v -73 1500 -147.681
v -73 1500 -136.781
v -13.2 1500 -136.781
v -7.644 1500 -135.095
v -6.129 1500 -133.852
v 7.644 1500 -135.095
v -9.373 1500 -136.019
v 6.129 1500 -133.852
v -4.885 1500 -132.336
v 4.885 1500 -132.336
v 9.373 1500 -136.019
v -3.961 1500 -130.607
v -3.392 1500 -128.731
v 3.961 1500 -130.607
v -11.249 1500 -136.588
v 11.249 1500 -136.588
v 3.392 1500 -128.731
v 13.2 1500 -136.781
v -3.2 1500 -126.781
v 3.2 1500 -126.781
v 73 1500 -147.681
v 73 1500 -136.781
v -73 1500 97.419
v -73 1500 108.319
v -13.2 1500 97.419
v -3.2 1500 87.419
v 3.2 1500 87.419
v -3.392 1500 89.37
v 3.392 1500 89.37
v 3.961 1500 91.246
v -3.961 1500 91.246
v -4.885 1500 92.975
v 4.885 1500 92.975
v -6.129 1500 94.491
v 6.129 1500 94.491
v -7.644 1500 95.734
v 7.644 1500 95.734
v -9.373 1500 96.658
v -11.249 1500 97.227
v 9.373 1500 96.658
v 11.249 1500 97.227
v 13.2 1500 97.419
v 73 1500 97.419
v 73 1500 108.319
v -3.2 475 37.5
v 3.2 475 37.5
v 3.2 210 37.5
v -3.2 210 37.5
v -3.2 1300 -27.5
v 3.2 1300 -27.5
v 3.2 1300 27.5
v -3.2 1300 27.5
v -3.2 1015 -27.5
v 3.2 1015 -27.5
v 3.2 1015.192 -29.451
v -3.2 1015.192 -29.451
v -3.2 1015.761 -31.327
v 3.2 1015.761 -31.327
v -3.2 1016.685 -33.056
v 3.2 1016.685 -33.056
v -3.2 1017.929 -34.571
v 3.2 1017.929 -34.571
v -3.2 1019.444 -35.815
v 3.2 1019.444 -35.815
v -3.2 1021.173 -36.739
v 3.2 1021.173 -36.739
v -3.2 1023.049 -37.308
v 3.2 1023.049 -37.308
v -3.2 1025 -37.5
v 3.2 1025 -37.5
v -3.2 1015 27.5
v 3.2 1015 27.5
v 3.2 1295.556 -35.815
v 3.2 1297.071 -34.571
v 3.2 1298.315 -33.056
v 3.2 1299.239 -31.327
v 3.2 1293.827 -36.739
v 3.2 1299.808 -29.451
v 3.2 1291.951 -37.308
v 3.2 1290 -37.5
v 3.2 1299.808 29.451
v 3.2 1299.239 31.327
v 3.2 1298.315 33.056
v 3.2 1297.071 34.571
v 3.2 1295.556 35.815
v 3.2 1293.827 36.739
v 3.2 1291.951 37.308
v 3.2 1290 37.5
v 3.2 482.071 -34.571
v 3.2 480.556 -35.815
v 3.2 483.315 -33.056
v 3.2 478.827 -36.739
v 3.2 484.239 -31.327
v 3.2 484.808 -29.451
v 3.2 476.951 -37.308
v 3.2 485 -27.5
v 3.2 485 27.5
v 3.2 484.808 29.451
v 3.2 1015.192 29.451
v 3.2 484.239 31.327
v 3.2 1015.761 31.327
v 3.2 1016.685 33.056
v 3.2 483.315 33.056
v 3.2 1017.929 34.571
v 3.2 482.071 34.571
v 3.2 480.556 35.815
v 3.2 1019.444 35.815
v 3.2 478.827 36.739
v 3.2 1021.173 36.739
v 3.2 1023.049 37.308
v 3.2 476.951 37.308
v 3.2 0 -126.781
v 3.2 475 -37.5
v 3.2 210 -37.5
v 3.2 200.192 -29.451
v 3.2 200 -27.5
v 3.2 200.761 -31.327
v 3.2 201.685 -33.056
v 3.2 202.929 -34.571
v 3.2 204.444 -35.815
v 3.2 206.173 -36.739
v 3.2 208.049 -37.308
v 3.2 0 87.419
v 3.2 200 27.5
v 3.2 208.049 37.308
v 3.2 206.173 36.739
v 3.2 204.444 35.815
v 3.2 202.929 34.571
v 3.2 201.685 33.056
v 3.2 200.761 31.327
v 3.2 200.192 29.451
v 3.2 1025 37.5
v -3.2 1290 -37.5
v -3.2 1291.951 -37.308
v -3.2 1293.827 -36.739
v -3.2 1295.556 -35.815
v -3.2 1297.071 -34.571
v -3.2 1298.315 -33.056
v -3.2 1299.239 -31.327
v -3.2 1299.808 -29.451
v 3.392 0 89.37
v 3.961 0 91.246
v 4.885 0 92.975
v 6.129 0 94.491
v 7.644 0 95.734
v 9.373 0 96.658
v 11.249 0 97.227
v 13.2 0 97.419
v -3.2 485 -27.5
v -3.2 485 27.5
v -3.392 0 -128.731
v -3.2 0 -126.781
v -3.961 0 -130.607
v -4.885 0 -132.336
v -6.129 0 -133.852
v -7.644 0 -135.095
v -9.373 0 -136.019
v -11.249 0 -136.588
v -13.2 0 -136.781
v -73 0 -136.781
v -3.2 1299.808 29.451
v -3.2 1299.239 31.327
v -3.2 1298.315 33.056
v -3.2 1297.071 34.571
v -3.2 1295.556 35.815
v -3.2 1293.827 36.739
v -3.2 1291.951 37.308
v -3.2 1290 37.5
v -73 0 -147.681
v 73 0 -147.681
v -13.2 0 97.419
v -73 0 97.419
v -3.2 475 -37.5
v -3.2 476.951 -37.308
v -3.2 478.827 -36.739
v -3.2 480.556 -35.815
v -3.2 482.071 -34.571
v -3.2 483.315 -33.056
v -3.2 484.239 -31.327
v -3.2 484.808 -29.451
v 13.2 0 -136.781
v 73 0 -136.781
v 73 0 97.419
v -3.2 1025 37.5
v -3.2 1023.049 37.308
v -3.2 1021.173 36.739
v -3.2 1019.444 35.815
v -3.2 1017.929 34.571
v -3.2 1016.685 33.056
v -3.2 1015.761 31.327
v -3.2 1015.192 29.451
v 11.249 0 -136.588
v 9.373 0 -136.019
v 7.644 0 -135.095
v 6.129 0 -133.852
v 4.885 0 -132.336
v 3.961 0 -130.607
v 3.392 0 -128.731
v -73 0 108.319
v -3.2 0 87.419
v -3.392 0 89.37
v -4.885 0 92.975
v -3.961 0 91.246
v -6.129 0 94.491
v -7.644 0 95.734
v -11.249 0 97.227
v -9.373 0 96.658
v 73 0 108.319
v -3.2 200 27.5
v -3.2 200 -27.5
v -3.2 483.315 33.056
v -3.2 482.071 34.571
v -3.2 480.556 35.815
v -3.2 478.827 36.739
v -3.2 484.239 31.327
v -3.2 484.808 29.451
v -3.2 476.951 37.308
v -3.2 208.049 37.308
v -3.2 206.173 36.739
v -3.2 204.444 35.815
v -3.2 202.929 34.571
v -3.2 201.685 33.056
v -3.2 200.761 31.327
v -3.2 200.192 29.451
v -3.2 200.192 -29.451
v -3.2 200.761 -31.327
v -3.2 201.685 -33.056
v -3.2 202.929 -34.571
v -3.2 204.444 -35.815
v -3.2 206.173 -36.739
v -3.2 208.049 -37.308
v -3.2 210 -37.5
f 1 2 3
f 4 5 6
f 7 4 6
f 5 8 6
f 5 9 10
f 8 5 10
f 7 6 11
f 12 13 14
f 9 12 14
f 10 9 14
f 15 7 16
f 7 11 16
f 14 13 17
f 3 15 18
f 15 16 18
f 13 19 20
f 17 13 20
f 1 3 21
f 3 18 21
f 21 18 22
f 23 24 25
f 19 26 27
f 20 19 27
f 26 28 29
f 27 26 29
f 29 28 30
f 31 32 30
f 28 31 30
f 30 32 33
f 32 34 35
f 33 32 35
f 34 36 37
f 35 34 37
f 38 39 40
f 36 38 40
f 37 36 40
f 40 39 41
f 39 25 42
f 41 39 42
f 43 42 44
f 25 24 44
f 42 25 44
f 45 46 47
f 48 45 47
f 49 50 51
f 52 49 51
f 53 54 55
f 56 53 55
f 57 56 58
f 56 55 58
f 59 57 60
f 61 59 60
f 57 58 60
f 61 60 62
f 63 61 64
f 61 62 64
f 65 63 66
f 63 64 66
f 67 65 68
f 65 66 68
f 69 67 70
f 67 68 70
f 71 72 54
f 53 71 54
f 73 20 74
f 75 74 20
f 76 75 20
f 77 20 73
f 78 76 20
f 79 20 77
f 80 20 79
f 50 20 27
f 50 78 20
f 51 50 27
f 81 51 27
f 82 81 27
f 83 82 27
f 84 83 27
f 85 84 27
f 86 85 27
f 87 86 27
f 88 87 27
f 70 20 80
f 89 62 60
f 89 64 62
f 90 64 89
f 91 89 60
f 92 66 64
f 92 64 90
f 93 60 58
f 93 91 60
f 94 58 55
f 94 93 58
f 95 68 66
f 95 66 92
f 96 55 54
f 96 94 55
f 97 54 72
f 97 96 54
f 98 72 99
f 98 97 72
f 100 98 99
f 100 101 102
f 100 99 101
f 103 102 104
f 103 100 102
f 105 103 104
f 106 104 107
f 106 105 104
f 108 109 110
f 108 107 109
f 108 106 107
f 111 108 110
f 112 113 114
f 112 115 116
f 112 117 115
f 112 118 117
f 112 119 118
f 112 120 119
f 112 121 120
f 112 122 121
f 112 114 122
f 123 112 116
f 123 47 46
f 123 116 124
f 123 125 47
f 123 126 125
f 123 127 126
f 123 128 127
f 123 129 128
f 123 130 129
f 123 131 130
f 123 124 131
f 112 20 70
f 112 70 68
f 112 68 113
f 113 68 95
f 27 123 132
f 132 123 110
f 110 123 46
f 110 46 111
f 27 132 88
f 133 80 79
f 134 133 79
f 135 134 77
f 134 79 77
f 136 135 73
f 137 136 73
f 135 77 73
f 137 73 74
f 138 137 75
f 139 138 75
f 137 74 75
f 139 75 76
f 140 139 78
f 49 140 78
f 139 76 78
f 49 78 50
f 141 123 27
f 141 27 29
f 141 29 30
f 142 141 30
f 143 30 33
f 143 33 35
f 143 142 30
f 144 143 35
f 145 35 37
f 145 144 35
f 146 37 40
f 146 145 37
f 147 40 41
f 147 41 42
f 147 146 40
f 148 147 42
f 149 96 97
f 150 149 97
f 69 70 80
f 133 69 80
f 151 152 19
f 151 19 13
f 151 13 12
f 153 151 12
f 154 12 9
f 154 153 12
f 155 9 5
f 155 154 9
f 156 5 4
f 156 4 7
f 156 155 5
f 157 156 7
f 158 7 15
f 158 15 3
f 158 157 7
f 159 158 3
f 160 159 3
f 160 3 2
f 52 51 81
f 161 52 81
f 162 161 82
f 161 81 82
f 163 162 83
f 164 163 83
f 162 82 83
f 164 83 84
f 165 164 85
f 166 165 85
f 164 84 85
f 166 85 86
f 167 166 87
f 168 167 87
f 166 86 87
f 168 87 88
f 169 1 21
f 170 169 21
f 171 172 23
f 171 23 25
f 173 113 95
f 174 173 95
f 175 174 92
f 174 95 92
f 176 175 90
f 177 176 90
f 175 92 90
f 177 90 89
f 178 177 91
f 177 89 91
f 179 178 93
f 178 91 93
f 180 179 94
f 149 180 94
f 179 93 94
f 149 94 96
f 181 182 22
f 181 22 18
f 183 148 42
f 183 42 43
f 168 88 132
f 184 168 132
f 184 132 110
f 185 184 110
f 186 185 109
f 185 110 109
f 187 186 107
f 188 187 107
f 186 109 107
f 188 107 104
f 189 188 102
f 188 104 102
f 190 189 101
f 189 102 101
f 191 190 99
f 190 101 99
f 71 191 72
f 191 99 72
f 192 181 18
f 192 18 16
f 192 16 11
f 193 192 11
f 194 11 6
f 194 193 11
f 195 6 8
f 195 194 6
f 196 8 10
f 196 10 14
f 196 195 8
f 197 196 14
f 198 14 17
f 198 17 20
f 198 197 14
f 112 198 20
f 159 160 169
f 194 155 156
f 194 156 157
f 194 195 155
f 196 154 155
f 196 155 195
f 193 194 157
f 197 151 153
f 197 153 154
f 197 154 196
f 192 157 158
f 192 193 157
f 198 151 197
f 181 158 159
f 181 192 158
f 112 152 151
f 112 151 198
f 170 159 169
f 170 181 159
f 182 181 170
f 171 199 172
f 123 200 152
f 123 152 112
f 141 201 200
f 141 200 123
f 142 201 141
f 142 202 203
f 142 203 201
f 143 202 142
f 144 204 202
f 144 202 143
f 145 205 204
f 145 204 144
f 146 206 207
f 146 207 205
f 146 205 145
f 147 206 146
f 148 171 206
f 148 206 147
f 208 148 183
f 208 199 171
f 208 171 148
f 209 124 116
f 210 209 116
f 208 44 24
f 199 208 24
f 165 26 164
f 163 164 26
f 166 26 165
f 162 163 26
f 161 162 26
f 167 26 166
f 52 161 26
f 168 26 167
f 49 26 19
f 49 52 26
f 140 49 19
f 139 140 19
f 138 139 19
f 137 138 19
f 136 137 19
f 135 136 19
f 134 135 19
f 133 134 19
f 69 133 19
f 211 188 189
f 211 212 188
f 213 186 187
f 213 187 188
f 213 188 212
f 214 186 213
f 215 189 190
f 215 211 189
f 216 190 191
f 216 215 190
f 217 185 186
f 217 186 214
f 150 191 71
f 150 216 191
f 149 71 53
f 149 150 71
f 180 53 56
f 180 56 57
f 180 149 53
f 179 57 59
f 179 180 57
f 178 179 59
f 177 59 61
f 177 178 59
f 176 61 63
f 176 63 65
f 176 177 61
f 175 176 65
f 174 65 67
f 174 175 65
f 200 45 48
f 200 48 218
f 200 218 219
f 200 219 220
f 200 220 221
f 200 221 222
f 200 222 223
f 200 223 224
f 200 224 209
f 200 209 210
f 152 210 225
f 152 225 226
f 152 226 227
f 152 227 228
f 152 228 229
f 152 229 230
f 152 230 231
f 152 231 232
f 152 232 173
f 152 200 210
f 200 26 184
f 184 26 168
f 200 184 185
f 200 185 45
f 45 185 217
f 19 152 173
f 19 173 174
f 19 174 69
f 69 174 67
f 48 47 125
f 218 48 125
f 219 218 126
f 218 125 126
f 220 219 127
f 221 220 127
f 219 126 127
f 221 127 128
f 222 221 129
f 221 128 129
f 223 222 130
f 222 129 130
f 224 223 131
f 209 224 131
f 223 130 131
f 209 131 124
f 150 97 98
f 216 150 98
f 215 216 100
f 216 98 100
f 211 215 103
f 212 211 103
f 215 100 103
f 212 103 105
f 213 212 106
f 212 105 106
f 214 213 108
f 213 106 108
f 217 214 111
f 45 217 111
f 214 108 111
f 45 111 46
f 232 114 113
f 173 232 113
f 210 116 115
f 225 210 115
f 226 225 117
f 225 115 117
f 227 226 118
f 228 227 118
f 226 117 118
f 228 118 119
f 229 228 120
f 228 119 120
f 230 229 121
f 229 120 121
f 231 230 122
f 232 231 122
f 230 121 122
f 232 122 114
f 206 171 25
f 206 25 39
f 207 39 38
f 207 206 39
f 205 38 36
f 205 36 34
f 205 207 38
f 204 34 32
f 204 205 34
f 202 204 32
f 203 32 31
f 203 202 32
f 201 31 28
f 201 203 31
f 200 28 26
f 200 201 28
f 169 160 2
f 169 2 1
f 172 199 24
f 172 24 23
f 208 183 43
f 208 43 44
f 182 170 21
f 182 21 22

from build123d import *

# Parameters (mm, degrees)
F1_DEPTH = 1500
F3_DEPTH = 76.201


with BuildPart() as f1:
    # F0 (on Front) → F1 (new body)
    with BuildSketch(Plane.XZ):
        with BuildLine():
            Line((73, 108.31944), (0, 108.31944))
            Line((0, 108.31944), (-73, 108.31944))
            Line((-73, 108.31944), (-73, 97.41944))
            Line((-73, 97.41944), (-13.2, 97.41944))
            ThreePointArc((-13.2, 97.41944), (-6.128932, 94.490508), (-3.2, 87.41944))
            Line((-3.2, 87.41944), (-3.2, -126.78056))
            ThreePointArc((-3.2, -126.78056), (-6.128932, -133.851628), (-13.2, -136.78056))
            Line((-13.2, -136.78056), (-73, -136.78056))
            Line((-73, -136.78056), (-73, -147.68056))
            Line((-73, -147.68056), (0, -147.68056))
            Line((0, -147.68056), (73, -147.68056))
            Line((73, -147.68056), (73, -136.78056))
            Line((73, -136.78056), (13.2, -136.78056))
            ThreePointArc((13.2, -136.78056), (6.128932, -133.851628), (3.2, -126.78056))
            Line((3.2, -126.78056), (3.2, 87.41944))
            ThreePointArc((3.2, 87.41944), (6.128932, 94.490508), (13.2, 97.41944))
            Line((13.2, 97.41944), (73, 97.41944))
            Line((73, 97.41944), (73, 108.31944))
        make_face()
    extrude(amount=-F1_DEPTH)

    # F2 (on face) → F3 (cut, through all)
    with BuildSketch(Plane.YZ.offset(3.2)):
        with BuildLine():
            Line((475, 37.5), (210, 37.5))
            ThreePointArc((210, 37.5), (202.928932, 34.571068), (200, 27.5))
            Line((200, 27.5), (200, -27.5))
            ThreePointArc((200, -27.5), (202.928932, -34.571068), (210, -37.5))
            Line((210, -37.5), (475, -37.5))
            ThreePointArc((475, -37.5), (482.071068, -34.571068), (485, -27.5))
            Line((485, -27.5), (485, 27.5))
            ThreePointArc((485, 27.5), (482.071068, 34.571068), (475, 37.5))
        make_face()
        with BuildLine():
            Line((1290, 37.5), (1025, 37.5))
            ThreePointArc((1025, 37.5), (1017.928932, 34.571068), (1015, 27.5))
            Line((1015, 27.5), (1015, -27.5))
            ThreePointArc((1015, -27.5), (1017.928932, -34.571068), (1025, -37.5))
            Line((1025, -37.5), (1290, -37.5))
            ThreePointArc((1290, -37.5), (1297.071068, -34.571068), (1300, -27.5))
            Line((1300, -27.5), (1300, 27.5))
            ThreePointArc((1300, 27.5), (1297.071068, 34.571068), (1290, 37.5))
        make_face()
    extrude(amount=-F3_DEPTH, mode=Mode.SUBTRACT)


solid = f1.part
